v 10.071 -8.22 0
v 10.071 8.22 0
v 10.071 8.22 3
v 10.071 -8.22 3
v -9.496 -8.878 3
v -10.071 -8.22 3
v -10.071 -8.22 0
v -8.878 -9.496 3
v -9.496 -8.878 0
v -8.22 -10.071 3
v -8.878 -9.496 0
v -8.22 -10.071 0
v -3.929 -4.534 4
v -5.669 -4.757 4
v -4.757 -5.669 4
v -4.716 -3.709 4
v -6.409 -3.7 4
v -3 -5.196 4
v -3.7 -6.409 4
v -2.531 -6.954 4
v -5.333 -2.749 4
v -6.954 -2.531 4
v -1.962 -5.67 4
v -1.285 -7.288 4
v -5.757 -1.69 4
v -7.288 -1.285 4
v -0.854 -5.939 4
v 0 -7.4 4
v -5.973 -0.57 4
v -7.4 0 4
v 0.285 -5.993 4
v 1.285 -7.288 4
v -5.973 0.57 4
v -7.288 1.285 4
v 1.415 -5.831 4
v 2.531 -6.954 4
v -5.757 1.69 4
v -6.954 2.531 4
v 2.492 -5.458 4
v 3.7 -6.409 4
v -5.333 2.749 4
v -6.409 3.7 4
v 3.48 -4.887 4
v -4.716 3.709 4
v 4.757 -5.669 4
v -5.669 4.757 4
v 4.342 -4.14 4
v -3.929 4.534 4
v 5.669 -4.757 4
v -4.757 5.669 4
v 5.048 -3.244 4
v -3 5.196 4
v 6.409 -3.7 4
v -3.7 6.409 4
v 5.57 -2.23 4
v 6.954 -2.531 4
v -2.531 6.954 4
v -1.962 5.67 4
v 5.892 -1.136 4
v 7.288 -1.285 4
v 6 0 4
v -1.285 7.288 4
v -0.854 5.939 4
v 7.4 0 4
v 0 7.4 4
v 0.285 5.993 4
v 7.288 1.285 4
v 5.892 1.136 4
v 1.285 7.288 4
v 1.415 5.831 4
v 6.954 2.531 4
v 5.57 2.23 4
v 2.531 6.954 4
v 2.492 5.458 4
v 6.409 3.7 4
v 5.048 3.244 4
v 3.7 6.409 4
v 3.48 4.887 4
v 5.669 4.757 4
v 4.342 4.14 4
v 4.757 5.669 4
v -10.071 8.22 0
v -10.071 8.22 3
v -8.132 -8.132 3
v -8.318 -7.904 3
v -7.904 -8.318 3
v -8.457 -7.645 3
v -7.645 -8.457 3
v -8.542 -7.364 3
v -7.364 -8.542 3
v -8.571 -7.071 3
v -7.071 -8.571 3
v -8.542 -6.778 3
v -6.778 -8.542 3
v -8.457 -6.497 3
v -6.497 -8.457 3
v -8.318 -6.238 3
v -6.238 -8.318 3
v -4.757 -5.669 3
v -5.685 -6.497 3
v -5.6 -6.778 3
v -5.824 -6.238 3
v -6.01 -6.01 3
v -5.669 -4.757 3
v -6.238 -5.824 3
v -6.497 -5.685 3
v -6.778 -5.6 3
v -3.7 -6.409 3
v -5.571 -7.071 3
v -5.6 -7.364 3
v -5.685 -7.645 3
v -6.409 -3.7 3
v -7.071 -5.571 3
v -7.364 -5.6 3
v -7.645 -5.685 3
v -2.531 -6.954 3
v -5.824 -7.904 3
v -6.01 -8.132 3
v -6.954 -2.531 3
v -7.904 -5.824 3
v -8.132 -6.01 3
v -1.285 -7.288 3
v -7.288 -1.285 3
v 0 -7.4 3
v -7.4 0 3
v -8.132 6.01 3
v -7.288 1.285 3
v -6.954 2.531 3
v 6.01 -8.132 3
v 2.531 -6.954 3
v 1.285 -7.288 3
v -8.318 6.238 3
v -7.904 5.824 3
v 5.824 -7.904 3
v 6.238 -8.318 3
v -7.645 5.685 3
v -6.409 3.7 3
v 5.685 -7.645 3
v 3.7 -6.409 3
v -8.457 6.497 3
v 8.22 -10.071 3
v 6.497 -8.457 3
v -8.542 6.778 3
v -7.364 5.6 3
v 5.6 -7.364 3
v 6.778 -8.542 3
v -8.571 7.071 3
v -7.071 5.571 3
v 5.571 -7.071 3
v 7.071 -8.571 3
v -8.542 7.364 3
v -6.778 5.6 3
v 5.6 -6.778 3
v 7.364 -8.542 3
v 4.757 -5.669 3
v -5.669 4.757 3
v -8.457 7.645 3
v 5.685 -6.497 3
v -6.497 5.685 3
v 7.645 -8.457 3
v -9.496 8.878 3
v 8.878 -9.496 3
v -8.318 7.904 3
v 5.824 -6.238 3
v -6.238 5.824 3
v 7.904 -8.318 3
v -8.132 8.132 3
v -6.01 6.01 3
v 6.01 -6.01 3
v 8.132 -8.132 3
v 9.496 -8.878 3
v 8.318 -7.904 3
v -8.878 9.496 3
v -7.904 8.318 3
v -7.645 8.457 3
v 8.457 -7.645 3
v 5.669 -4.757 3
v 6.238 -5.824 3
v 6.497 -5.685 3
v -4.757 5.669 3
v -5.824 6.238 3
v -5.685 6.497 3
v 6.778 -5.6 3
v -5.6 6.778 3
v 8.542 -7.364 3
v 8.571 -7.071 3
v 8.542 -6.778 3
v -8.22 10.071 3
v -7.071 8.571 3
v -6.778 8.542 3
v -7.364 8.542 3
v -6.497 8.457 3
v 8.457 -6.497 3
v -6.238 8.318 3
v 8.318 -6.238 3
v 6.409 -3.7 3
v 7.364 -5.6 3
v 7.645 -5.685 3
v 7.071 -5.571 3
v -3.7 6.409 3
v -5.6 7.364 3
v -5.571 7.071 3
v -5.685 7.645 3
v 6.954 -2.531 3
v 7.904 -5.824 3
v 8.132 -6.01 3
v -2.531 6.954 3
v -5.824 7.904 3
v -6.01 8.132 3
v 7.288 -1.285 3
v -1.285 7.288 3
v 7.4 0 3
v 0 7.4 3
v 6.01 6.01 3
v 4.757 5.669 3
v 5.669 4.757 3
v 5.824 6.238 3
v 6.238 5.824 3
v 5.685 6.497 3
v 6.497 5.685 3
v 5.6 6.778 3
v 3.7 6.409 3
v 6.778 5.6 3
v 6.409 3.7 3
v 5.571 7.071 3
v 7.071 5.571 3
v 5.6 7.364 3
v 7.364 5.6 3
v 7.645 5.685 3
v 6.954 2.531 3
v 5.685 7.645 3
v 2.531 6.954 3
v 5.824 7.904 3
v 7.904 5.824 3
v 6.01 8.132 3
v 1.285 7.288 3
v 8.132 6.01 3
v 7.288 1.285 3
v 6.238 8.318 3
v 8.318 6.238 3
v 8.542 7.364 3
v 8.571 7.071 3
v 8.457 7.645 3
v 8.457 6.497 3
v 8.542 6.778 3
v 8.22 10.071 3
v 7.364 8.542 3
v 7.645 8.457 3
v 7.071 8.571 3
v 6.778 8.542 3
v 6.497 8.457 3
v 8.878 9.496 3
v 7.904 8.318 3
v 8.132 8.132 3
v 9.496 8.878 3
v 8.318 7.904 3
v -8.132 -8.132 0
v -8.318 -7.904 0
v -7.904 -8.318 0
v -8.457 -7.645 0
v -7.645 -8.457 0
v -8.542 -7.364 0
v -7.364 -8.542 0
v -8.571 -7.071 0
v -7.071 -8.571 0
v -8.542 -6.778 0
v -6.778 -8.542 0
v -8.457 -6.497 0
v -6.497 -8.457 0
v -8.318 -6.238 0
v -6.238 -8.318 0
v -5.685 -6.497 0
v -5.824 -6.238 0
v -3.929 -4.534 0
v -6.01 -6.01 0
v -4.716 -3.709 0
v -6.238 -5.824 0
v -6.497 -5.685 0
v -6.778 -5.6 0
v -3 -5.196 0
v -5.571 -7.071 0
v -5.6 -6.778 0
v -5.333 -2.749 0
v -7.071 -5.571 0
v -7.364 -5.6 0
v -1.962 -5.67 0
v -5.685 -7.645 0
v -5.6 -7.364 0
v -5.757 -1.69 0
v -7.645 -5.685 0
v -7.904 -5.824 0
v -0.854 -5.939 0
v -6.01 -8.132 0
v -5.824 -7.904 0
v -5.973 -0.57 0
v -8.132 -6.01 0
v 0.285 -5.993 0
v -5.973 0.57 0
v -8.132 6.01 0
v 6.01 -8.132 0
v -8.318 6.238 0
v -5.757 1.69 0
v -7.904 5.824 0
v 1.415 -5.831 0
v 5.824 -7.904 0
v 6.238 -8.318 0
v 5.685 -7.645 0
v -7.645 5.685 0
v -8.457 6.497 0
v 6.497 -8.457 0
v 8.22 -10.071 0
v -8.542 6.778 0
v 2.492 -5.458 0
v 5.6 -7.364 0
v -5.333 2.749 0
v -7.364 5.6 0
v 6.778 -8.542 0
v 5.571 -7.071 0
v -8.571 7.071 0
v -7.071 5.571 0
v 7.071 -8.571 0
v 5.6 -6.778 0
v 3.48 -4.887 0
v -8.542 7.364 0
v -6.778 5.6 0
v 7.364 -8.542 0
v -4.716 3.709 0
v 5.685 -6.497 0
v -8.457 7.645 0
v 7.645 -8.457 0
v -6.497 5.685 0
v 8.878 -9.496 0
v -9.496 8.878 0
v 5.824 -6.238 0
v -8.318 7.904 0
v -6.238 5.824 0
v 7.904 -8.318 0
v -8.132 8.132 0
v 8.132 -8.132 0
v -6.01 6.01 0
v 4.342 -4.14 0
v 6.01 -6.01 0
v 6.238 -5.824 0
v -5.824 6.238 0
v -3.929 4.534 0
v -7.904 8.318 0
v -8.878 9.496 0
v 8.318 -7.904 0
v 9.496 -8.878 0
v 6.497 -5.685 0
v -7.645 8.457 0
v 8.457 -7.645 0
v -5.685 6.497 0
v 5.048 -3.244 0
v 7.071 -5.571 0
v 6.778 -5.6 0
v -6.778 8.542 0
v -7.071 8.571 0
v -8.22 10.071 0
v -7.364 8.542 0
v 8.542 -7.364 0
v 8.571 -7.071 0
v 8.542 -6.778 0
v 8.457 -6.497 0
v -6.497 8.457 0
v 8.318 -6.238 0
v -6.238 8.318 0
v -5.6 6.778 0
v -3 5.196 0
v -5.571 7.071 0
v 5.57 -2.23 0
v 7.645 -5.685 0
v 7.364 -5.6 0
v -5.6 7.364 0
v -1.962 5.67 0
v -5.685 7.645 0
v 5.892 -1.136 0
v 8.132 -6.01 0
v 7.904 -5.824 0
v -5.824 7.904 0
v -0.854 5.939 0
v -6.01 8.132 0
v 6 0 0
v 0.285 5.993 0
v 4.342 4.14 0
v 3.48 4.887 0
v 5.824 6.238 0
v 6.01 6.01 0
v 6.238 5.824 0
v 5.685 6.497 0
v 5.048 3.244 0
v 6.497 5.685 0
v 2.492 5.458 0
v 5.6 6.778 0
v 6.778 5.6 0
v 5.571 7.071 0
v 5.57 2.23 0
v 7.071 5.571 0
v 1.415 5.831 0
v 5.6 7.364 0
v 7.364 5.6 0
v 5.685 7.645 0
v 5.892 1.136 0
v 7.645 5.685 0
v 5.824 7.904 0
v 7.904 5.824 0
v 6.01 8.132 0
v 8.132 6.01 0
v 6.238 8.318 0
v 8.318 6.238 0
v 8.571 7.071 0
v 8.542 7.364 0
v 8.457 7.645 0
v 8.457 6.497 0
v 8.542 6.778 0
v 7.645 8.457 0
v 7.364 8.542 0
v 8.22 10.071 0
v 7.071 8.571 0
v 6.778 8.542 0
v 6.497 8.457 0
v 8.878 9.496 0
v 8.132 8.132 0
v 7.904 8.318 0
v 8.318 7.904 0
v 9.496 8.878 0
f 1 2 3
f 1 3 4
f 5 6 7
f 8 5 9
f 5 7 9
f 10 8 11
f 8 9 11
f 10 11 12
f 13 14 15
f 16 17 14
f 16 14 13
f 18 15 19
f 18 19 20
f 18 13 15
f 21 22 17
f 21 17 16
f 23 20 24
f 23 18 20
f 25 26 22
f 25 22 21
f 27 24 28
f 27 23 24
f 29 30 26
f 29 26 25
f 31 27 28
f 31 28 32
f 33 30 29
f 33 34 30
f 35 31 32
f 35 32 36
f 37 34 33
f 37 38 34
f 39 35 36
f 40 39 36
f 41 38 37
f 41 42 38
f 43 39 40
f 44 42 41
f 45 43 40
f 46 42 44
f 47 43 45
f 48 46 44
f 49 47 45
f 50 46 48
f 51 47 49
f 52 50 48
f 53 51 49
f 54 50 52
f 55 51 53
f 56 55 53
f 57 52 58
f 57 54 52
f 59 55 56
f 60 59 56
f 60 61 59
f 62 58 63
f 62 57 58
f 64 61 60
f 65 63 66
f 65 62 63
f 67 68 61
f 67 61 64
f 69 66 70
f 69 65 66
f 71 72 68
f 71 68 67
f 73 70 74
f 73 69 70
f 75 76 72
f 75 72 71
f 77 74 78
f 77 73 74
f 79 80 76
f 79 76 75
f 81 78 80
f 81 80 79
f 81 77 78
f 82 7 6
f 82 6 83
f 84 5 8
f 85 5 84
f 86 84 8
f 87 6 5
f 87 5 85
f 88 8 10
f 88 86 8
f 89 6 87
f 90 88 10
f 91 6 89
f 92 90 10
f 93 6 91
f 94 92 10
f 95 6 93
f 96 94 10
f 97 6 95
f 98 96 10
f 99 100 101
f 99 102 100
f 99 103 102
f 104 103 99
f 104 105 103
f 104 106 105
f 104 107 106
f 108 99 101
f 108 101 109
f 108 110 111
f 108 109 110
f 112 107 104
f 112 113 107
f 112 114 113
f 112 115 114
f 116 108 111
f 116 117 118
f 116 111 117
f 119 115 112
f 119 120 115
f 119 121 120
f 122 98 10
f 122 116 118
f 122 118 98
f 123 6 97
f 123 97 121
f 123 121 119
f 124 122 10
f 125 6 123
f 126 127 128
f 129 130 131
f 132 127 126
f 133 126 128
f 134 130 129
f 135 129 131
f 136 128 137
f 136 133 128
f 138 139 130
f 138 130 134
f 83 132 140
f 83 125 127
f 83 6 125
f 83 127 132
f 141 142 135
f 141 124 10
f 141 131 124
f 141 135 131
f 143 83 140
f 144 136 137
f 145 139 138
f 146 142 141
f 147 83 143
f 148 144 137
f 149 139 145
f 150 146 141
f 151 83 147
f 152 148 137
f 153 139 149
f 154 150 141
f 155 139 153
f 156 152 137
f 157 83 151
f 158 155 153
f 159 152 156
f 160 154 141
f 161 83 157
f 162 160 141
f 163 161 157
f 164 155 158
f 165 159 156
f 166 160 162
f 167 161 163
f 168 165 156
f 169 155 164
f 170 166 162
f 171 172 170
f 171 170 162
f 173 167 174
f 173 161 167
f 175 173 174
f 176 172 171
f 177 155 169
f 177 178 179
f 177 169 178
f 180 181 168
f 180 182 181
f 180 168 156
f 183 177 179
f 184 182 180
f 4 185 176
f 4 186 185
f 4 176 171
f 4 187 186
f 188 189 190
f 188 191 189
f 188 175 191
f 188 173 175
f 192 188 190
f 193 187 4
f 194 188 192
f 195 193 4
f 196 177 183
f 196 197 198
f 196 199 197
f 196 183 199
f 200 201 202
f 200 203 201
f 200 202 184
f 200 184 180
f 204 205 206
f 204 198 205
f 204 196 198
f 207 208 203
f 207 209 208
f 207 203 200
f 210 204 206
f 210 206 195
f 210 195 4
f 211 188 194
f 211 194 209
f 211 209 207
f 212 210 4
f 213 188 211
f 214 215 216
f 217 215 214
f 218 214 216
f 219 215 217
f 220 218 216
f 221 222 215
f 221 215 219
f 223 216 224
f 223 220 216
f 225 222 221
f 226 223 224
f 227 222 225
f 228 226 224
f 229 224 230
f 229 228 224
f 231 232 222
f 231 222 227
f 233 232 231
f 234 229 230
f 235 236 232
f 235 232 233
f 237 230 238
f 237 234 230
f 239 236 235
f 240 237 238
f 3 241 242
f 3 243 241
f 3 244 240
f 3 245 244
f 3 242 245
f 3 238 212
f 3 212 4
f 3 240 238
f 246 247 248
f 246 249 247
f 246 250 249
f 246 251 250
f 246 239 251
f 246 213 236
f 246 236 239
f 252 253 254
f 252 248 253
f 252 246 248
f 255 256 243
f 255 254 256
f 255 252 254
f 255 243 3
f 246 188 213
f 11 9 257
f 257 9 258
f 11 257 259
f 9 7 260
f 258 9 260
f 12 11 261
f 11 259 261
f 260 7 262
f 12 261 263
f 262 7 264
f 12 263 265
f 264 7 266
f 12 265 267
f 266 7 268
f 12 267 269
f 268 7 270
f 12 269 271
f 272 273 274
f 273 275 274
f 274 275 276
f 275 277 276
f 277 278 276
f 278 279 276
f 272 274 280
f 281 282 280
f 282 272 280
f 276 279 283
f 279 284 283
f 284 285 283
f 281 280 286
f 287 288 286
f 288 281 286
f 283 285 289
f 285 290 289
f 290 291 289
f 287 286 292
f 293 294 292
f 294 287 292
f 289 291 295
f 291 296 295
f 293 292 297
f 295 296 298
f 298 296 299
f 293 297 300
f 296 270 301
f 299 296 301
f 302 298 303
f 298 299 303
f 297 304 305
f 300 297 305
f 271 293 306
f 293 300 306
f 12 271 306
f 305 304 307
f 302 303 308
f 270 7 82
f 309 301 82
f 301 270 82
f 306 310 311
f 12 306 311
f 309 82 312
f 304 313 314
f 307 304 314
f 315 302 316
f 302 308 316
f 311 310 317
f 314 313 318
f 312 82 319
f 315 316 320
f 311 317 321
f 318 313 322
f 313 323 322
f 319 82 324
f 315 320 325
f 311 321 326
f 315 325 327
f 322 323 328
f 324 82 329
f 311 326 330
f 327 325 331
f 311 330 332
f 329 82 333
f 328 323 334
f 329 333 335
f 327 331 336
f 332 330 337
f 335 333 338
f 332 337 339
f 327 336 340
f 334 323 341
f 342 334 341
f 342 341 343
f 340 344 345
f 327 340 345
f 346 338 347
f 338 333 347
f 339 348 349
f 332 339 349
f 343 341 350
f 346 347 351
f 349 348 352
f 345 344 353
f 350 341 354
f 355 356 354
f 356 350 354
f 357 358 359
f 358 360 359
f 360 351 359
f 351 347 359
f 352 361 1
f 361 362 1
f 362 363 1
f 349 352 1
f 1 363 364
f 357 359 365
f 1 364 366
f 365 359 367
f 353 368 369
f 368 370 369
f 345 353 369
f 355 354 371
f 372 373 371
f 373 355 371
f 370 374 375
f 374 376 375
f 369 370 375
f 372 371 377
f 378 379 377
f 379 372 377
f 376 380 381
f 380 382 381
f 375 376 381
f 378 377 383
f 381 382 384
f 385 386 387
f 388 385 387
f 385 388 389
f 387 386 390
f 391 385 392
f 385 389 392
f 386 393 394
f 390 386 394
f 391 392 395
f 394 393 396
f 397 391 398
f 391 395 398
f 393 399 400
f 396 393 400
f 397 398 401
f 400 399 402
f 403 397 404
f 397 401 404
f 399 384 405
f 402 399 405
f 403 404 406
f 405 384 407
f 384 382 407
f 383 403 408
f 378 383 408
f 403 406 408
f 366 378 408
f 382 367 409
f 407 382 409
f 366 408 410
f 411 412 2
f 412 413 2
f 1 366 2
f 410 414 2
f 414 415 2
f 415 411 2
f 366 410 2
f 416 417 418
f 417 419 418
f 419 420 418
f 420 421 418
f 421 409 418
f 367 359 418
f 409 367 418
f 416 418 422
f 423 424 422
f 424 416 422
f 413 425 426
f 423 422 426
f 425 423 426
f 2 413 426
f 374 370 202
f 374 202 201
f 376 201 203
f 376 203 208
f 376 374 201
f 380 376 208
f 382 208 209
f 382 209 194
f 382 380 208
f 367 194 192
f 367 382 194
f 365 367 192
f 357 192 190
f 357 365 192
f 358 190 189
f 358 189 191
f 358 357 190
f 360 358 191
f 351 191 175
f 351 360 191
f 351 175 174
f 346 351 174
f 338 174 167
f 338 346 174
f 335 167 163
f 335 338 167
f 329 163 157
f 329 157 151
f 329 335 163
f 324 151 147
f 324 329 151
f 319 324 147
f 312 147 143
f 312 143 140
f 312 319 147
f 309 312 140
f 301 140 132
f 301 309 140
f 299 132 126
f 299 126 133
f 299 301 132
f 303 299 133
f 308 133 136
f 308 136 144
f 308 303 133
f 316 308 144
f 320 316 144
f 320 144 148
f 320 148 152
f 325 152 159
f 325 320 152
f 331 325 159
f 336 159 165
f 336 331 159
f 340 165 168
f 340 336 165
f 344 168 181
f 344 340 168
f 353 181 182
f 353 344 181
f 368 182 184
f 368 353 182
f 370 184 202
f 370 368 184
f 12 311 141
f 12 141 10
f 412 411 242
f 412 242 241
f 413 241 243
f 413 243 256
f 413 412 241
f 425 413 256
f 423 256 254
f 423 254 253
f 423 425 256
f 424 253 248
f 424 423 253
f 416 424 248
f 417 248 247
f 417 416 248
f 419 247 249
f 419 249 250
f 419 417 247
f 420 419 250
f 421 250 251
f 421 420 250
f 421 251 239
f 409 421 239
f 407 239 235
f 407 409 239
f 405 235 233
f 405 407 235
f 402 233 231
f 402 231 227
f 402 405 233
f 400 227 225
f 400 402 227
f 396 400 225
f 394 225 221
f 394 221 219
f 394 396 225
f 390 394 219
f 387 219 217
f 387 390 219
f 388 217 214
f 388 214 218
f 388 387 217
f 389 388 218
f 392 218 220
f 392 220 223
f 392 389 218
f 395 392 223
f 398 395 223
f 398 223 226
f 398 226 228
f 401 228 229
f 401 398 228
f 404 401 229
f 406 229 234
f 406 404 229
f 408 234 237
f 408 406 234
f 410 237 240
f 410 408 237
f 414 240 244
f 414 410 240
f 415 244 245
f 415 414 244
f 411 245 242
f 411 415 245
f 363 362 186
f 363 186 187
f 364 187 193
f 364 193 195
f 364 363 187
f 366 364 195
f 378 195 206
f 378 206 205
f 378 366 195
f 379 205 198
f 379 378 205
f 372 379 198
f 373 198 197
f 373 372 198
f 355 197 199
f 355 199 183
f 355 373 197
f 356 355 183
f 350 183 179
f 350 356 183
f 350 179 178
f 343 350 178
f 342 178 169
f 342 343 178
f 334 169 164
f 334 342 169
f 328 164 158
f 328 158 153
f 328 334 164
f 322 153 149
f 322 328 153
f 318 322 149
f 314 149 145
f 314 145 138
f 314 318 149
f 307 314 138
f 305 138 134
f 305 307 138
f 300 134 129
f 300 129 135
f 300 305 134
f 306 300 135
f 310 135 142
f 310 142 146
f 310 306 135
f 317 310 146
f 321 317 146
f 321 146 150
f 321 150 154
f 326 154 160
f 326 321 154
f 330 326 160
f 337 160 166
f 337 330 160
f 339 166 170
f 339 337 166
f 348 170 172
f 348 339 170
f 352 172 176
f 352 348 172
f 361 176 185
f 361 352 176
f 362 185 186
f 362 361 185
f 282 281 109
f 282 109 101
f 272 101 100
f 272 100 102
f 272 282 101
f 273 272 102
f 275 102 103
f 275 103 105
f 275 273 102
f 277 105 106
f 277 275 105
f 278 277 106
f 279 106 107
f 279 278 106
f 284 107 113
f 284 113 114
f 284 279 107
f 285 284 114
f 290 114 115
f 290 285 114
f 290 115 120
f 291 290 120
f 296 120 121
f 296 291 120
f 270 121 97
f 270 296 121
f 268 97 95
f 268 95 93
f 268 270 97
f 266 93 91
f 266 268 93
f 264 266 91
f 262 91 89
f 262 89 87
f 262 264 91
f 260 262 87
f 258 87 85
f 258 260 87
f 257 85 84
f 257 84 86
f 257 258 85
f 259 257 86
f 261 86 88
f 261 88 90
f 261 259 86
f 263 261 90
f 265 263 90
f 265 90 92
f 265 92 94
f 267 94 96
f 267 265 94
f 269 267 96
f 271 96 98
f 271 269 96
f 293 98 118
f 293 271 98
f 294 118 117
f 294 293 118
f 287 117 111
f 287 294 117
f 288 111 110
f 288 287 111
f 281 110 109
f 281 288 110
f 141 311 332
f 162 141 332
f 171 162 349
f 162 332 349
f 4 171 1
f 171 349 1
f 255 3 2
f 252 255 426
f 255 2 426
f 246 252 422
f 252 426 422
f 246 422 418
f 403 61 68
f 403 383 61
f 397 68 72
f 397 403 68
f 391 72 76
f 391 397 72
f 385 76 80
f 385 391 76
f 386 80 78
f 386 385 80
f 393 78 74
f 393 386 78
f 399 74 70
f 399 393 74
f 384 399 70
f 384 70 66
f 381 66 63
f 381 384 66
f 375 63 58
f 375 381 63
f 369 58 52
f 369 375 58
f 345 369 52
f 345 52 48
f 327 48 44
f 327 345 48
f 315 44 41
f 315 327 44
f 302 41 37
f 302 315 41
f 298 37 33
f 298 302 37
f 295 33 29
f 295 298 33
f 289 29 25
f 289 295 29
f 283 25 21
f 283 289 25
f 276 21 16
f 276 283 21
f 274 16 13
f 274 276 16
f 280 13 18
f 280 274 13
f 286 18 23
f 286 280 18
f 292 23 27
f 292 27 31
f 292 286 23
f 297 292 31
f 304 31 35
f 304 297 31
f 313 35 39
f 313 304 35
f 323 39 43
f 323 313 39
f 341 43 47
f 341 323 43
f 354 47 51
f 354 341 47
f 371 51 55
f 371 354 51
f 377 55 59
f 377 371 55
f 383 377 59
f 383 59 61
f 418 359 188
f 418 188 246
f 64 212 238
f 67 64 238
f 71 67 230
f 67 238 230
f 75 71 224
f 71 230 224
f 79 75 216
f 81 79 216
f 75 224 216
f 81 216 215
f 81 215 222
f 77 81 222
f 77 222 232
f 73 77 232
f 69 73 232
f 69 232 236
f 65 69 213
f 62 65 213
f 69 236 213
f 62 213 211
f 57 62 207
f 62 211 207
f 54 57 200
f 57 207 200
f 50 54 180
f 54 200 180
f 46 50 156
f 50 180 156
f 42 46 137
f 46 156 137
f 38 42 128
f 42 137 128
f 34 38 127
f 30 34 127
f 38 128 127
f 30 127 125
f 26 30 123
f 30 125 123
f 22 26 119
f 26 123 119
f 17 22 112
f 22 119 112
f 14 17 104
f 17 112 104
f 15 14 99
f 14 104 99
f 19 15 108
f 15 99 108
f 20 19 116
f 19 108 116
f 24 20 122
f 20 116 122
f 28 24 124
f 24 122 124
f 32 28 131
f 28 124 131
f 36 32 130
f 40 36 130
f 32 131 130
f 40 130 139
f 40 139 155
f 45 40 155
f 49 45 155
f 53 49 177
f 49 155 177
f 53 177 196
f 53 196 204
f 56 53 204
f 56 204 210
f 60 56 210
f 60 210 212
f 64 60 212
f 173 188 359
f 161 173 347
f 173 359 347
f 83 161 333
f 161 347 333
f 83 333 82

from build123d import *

# Parameters (mm, degrees)
SKETCH_1_R          = 13
SKETCH_1_R_2        = 6
SKETCH_1_R_3        = 1.5
EXTRUDE_1_DEPTH     = 3
SKETCH_2_R          = 7.4
SKETCH_2_R_2        = 6
EXTRUDE_2_DEPTH     = 1
CUT_EXTRUDE_START   = -41
CUT_EXTRUDE_1_DEPTH = 41


with BuildPart() as part:
    # 草图1 → 凸台-拉伸1 (new body)
    with BuildSketch(Plane.XY):
        Circle(SKETCH_1_R)
        Circle(SKETCH_1_R_2, mode=Mode.SUBTRACT)
        with Locations((-7.071067812, 7.071067812)):
            Circle(SKETCH_1_R_3, mode=Mode.SUBTRACT)
        with Locations((7.071067812, 7.071067812)):
            Circle(SKETCH_1_R_3, mode=Mode.SUBTRACT)
        with Locations((7.071067812, -7.071067812)):
            Circle(SKETCH_1_R_3, mode=Mode.SUBTRACT)
        with Locations((-7.071067812, -7.071067812)):
            Circle(SKETCH_1_R_3, mode=Mode.SUBTRACT)
    extrude(amount=EXTRUDE_1_DEPTH)

    # 草图2 → 凸台-拉伸2 (add)
    with BuildSketch(Plane.XY.offset(3)):
        Circle(SKETCH_2_R)
        Circle(SKETCH_2_R_2, mode=Mode.SUBTRACT)
    extrude(amount=EXTRUDE_2_DEPTH)

    # 草图3 → 切除-拉伸1 (cut)
    with BuildSketch(Plane.XY.offset(3).offset(CUT_EXTRUDE_START)):
        with BuildLine():
            Line((-8.220315878, 10.071067812), (8.220315878, 10.071067812))
            ThreePointArc((8.220315878, 10.071067812), (0, 13), (-8.220315878, 10.071067812))
        make_face()
        with BuildLine():
            Line((10.071067812, 8.220315878), (10.071067812, -8.220315878))
            ThreePointArc((10.071067812, -8.220315878), (13, 0), (10.071067812, 8.220315878))
        make_face()
        with BuildLine():
            Line((8.220315878, -10.071067812), (-8.220315878, -10.071067812))
            ThreePointArc((-8.220315878, -10.071067812), (0, -13), (8.220315878, -10.071067812))
        make_face()
        with BuildLine():
            Line((-10.071067812, -8.220315878), (-10.071067812, 8.220315878))
            ThreePointArc((-10.071067812, 8.220315878), (-13, 0), (-10.071067812, -8.220315878))
        make_face()
    extrude(amount=CUT_EXTRUDE_1_DEPTH, mode=Mode.SUBTRACT)


solid = part.part
